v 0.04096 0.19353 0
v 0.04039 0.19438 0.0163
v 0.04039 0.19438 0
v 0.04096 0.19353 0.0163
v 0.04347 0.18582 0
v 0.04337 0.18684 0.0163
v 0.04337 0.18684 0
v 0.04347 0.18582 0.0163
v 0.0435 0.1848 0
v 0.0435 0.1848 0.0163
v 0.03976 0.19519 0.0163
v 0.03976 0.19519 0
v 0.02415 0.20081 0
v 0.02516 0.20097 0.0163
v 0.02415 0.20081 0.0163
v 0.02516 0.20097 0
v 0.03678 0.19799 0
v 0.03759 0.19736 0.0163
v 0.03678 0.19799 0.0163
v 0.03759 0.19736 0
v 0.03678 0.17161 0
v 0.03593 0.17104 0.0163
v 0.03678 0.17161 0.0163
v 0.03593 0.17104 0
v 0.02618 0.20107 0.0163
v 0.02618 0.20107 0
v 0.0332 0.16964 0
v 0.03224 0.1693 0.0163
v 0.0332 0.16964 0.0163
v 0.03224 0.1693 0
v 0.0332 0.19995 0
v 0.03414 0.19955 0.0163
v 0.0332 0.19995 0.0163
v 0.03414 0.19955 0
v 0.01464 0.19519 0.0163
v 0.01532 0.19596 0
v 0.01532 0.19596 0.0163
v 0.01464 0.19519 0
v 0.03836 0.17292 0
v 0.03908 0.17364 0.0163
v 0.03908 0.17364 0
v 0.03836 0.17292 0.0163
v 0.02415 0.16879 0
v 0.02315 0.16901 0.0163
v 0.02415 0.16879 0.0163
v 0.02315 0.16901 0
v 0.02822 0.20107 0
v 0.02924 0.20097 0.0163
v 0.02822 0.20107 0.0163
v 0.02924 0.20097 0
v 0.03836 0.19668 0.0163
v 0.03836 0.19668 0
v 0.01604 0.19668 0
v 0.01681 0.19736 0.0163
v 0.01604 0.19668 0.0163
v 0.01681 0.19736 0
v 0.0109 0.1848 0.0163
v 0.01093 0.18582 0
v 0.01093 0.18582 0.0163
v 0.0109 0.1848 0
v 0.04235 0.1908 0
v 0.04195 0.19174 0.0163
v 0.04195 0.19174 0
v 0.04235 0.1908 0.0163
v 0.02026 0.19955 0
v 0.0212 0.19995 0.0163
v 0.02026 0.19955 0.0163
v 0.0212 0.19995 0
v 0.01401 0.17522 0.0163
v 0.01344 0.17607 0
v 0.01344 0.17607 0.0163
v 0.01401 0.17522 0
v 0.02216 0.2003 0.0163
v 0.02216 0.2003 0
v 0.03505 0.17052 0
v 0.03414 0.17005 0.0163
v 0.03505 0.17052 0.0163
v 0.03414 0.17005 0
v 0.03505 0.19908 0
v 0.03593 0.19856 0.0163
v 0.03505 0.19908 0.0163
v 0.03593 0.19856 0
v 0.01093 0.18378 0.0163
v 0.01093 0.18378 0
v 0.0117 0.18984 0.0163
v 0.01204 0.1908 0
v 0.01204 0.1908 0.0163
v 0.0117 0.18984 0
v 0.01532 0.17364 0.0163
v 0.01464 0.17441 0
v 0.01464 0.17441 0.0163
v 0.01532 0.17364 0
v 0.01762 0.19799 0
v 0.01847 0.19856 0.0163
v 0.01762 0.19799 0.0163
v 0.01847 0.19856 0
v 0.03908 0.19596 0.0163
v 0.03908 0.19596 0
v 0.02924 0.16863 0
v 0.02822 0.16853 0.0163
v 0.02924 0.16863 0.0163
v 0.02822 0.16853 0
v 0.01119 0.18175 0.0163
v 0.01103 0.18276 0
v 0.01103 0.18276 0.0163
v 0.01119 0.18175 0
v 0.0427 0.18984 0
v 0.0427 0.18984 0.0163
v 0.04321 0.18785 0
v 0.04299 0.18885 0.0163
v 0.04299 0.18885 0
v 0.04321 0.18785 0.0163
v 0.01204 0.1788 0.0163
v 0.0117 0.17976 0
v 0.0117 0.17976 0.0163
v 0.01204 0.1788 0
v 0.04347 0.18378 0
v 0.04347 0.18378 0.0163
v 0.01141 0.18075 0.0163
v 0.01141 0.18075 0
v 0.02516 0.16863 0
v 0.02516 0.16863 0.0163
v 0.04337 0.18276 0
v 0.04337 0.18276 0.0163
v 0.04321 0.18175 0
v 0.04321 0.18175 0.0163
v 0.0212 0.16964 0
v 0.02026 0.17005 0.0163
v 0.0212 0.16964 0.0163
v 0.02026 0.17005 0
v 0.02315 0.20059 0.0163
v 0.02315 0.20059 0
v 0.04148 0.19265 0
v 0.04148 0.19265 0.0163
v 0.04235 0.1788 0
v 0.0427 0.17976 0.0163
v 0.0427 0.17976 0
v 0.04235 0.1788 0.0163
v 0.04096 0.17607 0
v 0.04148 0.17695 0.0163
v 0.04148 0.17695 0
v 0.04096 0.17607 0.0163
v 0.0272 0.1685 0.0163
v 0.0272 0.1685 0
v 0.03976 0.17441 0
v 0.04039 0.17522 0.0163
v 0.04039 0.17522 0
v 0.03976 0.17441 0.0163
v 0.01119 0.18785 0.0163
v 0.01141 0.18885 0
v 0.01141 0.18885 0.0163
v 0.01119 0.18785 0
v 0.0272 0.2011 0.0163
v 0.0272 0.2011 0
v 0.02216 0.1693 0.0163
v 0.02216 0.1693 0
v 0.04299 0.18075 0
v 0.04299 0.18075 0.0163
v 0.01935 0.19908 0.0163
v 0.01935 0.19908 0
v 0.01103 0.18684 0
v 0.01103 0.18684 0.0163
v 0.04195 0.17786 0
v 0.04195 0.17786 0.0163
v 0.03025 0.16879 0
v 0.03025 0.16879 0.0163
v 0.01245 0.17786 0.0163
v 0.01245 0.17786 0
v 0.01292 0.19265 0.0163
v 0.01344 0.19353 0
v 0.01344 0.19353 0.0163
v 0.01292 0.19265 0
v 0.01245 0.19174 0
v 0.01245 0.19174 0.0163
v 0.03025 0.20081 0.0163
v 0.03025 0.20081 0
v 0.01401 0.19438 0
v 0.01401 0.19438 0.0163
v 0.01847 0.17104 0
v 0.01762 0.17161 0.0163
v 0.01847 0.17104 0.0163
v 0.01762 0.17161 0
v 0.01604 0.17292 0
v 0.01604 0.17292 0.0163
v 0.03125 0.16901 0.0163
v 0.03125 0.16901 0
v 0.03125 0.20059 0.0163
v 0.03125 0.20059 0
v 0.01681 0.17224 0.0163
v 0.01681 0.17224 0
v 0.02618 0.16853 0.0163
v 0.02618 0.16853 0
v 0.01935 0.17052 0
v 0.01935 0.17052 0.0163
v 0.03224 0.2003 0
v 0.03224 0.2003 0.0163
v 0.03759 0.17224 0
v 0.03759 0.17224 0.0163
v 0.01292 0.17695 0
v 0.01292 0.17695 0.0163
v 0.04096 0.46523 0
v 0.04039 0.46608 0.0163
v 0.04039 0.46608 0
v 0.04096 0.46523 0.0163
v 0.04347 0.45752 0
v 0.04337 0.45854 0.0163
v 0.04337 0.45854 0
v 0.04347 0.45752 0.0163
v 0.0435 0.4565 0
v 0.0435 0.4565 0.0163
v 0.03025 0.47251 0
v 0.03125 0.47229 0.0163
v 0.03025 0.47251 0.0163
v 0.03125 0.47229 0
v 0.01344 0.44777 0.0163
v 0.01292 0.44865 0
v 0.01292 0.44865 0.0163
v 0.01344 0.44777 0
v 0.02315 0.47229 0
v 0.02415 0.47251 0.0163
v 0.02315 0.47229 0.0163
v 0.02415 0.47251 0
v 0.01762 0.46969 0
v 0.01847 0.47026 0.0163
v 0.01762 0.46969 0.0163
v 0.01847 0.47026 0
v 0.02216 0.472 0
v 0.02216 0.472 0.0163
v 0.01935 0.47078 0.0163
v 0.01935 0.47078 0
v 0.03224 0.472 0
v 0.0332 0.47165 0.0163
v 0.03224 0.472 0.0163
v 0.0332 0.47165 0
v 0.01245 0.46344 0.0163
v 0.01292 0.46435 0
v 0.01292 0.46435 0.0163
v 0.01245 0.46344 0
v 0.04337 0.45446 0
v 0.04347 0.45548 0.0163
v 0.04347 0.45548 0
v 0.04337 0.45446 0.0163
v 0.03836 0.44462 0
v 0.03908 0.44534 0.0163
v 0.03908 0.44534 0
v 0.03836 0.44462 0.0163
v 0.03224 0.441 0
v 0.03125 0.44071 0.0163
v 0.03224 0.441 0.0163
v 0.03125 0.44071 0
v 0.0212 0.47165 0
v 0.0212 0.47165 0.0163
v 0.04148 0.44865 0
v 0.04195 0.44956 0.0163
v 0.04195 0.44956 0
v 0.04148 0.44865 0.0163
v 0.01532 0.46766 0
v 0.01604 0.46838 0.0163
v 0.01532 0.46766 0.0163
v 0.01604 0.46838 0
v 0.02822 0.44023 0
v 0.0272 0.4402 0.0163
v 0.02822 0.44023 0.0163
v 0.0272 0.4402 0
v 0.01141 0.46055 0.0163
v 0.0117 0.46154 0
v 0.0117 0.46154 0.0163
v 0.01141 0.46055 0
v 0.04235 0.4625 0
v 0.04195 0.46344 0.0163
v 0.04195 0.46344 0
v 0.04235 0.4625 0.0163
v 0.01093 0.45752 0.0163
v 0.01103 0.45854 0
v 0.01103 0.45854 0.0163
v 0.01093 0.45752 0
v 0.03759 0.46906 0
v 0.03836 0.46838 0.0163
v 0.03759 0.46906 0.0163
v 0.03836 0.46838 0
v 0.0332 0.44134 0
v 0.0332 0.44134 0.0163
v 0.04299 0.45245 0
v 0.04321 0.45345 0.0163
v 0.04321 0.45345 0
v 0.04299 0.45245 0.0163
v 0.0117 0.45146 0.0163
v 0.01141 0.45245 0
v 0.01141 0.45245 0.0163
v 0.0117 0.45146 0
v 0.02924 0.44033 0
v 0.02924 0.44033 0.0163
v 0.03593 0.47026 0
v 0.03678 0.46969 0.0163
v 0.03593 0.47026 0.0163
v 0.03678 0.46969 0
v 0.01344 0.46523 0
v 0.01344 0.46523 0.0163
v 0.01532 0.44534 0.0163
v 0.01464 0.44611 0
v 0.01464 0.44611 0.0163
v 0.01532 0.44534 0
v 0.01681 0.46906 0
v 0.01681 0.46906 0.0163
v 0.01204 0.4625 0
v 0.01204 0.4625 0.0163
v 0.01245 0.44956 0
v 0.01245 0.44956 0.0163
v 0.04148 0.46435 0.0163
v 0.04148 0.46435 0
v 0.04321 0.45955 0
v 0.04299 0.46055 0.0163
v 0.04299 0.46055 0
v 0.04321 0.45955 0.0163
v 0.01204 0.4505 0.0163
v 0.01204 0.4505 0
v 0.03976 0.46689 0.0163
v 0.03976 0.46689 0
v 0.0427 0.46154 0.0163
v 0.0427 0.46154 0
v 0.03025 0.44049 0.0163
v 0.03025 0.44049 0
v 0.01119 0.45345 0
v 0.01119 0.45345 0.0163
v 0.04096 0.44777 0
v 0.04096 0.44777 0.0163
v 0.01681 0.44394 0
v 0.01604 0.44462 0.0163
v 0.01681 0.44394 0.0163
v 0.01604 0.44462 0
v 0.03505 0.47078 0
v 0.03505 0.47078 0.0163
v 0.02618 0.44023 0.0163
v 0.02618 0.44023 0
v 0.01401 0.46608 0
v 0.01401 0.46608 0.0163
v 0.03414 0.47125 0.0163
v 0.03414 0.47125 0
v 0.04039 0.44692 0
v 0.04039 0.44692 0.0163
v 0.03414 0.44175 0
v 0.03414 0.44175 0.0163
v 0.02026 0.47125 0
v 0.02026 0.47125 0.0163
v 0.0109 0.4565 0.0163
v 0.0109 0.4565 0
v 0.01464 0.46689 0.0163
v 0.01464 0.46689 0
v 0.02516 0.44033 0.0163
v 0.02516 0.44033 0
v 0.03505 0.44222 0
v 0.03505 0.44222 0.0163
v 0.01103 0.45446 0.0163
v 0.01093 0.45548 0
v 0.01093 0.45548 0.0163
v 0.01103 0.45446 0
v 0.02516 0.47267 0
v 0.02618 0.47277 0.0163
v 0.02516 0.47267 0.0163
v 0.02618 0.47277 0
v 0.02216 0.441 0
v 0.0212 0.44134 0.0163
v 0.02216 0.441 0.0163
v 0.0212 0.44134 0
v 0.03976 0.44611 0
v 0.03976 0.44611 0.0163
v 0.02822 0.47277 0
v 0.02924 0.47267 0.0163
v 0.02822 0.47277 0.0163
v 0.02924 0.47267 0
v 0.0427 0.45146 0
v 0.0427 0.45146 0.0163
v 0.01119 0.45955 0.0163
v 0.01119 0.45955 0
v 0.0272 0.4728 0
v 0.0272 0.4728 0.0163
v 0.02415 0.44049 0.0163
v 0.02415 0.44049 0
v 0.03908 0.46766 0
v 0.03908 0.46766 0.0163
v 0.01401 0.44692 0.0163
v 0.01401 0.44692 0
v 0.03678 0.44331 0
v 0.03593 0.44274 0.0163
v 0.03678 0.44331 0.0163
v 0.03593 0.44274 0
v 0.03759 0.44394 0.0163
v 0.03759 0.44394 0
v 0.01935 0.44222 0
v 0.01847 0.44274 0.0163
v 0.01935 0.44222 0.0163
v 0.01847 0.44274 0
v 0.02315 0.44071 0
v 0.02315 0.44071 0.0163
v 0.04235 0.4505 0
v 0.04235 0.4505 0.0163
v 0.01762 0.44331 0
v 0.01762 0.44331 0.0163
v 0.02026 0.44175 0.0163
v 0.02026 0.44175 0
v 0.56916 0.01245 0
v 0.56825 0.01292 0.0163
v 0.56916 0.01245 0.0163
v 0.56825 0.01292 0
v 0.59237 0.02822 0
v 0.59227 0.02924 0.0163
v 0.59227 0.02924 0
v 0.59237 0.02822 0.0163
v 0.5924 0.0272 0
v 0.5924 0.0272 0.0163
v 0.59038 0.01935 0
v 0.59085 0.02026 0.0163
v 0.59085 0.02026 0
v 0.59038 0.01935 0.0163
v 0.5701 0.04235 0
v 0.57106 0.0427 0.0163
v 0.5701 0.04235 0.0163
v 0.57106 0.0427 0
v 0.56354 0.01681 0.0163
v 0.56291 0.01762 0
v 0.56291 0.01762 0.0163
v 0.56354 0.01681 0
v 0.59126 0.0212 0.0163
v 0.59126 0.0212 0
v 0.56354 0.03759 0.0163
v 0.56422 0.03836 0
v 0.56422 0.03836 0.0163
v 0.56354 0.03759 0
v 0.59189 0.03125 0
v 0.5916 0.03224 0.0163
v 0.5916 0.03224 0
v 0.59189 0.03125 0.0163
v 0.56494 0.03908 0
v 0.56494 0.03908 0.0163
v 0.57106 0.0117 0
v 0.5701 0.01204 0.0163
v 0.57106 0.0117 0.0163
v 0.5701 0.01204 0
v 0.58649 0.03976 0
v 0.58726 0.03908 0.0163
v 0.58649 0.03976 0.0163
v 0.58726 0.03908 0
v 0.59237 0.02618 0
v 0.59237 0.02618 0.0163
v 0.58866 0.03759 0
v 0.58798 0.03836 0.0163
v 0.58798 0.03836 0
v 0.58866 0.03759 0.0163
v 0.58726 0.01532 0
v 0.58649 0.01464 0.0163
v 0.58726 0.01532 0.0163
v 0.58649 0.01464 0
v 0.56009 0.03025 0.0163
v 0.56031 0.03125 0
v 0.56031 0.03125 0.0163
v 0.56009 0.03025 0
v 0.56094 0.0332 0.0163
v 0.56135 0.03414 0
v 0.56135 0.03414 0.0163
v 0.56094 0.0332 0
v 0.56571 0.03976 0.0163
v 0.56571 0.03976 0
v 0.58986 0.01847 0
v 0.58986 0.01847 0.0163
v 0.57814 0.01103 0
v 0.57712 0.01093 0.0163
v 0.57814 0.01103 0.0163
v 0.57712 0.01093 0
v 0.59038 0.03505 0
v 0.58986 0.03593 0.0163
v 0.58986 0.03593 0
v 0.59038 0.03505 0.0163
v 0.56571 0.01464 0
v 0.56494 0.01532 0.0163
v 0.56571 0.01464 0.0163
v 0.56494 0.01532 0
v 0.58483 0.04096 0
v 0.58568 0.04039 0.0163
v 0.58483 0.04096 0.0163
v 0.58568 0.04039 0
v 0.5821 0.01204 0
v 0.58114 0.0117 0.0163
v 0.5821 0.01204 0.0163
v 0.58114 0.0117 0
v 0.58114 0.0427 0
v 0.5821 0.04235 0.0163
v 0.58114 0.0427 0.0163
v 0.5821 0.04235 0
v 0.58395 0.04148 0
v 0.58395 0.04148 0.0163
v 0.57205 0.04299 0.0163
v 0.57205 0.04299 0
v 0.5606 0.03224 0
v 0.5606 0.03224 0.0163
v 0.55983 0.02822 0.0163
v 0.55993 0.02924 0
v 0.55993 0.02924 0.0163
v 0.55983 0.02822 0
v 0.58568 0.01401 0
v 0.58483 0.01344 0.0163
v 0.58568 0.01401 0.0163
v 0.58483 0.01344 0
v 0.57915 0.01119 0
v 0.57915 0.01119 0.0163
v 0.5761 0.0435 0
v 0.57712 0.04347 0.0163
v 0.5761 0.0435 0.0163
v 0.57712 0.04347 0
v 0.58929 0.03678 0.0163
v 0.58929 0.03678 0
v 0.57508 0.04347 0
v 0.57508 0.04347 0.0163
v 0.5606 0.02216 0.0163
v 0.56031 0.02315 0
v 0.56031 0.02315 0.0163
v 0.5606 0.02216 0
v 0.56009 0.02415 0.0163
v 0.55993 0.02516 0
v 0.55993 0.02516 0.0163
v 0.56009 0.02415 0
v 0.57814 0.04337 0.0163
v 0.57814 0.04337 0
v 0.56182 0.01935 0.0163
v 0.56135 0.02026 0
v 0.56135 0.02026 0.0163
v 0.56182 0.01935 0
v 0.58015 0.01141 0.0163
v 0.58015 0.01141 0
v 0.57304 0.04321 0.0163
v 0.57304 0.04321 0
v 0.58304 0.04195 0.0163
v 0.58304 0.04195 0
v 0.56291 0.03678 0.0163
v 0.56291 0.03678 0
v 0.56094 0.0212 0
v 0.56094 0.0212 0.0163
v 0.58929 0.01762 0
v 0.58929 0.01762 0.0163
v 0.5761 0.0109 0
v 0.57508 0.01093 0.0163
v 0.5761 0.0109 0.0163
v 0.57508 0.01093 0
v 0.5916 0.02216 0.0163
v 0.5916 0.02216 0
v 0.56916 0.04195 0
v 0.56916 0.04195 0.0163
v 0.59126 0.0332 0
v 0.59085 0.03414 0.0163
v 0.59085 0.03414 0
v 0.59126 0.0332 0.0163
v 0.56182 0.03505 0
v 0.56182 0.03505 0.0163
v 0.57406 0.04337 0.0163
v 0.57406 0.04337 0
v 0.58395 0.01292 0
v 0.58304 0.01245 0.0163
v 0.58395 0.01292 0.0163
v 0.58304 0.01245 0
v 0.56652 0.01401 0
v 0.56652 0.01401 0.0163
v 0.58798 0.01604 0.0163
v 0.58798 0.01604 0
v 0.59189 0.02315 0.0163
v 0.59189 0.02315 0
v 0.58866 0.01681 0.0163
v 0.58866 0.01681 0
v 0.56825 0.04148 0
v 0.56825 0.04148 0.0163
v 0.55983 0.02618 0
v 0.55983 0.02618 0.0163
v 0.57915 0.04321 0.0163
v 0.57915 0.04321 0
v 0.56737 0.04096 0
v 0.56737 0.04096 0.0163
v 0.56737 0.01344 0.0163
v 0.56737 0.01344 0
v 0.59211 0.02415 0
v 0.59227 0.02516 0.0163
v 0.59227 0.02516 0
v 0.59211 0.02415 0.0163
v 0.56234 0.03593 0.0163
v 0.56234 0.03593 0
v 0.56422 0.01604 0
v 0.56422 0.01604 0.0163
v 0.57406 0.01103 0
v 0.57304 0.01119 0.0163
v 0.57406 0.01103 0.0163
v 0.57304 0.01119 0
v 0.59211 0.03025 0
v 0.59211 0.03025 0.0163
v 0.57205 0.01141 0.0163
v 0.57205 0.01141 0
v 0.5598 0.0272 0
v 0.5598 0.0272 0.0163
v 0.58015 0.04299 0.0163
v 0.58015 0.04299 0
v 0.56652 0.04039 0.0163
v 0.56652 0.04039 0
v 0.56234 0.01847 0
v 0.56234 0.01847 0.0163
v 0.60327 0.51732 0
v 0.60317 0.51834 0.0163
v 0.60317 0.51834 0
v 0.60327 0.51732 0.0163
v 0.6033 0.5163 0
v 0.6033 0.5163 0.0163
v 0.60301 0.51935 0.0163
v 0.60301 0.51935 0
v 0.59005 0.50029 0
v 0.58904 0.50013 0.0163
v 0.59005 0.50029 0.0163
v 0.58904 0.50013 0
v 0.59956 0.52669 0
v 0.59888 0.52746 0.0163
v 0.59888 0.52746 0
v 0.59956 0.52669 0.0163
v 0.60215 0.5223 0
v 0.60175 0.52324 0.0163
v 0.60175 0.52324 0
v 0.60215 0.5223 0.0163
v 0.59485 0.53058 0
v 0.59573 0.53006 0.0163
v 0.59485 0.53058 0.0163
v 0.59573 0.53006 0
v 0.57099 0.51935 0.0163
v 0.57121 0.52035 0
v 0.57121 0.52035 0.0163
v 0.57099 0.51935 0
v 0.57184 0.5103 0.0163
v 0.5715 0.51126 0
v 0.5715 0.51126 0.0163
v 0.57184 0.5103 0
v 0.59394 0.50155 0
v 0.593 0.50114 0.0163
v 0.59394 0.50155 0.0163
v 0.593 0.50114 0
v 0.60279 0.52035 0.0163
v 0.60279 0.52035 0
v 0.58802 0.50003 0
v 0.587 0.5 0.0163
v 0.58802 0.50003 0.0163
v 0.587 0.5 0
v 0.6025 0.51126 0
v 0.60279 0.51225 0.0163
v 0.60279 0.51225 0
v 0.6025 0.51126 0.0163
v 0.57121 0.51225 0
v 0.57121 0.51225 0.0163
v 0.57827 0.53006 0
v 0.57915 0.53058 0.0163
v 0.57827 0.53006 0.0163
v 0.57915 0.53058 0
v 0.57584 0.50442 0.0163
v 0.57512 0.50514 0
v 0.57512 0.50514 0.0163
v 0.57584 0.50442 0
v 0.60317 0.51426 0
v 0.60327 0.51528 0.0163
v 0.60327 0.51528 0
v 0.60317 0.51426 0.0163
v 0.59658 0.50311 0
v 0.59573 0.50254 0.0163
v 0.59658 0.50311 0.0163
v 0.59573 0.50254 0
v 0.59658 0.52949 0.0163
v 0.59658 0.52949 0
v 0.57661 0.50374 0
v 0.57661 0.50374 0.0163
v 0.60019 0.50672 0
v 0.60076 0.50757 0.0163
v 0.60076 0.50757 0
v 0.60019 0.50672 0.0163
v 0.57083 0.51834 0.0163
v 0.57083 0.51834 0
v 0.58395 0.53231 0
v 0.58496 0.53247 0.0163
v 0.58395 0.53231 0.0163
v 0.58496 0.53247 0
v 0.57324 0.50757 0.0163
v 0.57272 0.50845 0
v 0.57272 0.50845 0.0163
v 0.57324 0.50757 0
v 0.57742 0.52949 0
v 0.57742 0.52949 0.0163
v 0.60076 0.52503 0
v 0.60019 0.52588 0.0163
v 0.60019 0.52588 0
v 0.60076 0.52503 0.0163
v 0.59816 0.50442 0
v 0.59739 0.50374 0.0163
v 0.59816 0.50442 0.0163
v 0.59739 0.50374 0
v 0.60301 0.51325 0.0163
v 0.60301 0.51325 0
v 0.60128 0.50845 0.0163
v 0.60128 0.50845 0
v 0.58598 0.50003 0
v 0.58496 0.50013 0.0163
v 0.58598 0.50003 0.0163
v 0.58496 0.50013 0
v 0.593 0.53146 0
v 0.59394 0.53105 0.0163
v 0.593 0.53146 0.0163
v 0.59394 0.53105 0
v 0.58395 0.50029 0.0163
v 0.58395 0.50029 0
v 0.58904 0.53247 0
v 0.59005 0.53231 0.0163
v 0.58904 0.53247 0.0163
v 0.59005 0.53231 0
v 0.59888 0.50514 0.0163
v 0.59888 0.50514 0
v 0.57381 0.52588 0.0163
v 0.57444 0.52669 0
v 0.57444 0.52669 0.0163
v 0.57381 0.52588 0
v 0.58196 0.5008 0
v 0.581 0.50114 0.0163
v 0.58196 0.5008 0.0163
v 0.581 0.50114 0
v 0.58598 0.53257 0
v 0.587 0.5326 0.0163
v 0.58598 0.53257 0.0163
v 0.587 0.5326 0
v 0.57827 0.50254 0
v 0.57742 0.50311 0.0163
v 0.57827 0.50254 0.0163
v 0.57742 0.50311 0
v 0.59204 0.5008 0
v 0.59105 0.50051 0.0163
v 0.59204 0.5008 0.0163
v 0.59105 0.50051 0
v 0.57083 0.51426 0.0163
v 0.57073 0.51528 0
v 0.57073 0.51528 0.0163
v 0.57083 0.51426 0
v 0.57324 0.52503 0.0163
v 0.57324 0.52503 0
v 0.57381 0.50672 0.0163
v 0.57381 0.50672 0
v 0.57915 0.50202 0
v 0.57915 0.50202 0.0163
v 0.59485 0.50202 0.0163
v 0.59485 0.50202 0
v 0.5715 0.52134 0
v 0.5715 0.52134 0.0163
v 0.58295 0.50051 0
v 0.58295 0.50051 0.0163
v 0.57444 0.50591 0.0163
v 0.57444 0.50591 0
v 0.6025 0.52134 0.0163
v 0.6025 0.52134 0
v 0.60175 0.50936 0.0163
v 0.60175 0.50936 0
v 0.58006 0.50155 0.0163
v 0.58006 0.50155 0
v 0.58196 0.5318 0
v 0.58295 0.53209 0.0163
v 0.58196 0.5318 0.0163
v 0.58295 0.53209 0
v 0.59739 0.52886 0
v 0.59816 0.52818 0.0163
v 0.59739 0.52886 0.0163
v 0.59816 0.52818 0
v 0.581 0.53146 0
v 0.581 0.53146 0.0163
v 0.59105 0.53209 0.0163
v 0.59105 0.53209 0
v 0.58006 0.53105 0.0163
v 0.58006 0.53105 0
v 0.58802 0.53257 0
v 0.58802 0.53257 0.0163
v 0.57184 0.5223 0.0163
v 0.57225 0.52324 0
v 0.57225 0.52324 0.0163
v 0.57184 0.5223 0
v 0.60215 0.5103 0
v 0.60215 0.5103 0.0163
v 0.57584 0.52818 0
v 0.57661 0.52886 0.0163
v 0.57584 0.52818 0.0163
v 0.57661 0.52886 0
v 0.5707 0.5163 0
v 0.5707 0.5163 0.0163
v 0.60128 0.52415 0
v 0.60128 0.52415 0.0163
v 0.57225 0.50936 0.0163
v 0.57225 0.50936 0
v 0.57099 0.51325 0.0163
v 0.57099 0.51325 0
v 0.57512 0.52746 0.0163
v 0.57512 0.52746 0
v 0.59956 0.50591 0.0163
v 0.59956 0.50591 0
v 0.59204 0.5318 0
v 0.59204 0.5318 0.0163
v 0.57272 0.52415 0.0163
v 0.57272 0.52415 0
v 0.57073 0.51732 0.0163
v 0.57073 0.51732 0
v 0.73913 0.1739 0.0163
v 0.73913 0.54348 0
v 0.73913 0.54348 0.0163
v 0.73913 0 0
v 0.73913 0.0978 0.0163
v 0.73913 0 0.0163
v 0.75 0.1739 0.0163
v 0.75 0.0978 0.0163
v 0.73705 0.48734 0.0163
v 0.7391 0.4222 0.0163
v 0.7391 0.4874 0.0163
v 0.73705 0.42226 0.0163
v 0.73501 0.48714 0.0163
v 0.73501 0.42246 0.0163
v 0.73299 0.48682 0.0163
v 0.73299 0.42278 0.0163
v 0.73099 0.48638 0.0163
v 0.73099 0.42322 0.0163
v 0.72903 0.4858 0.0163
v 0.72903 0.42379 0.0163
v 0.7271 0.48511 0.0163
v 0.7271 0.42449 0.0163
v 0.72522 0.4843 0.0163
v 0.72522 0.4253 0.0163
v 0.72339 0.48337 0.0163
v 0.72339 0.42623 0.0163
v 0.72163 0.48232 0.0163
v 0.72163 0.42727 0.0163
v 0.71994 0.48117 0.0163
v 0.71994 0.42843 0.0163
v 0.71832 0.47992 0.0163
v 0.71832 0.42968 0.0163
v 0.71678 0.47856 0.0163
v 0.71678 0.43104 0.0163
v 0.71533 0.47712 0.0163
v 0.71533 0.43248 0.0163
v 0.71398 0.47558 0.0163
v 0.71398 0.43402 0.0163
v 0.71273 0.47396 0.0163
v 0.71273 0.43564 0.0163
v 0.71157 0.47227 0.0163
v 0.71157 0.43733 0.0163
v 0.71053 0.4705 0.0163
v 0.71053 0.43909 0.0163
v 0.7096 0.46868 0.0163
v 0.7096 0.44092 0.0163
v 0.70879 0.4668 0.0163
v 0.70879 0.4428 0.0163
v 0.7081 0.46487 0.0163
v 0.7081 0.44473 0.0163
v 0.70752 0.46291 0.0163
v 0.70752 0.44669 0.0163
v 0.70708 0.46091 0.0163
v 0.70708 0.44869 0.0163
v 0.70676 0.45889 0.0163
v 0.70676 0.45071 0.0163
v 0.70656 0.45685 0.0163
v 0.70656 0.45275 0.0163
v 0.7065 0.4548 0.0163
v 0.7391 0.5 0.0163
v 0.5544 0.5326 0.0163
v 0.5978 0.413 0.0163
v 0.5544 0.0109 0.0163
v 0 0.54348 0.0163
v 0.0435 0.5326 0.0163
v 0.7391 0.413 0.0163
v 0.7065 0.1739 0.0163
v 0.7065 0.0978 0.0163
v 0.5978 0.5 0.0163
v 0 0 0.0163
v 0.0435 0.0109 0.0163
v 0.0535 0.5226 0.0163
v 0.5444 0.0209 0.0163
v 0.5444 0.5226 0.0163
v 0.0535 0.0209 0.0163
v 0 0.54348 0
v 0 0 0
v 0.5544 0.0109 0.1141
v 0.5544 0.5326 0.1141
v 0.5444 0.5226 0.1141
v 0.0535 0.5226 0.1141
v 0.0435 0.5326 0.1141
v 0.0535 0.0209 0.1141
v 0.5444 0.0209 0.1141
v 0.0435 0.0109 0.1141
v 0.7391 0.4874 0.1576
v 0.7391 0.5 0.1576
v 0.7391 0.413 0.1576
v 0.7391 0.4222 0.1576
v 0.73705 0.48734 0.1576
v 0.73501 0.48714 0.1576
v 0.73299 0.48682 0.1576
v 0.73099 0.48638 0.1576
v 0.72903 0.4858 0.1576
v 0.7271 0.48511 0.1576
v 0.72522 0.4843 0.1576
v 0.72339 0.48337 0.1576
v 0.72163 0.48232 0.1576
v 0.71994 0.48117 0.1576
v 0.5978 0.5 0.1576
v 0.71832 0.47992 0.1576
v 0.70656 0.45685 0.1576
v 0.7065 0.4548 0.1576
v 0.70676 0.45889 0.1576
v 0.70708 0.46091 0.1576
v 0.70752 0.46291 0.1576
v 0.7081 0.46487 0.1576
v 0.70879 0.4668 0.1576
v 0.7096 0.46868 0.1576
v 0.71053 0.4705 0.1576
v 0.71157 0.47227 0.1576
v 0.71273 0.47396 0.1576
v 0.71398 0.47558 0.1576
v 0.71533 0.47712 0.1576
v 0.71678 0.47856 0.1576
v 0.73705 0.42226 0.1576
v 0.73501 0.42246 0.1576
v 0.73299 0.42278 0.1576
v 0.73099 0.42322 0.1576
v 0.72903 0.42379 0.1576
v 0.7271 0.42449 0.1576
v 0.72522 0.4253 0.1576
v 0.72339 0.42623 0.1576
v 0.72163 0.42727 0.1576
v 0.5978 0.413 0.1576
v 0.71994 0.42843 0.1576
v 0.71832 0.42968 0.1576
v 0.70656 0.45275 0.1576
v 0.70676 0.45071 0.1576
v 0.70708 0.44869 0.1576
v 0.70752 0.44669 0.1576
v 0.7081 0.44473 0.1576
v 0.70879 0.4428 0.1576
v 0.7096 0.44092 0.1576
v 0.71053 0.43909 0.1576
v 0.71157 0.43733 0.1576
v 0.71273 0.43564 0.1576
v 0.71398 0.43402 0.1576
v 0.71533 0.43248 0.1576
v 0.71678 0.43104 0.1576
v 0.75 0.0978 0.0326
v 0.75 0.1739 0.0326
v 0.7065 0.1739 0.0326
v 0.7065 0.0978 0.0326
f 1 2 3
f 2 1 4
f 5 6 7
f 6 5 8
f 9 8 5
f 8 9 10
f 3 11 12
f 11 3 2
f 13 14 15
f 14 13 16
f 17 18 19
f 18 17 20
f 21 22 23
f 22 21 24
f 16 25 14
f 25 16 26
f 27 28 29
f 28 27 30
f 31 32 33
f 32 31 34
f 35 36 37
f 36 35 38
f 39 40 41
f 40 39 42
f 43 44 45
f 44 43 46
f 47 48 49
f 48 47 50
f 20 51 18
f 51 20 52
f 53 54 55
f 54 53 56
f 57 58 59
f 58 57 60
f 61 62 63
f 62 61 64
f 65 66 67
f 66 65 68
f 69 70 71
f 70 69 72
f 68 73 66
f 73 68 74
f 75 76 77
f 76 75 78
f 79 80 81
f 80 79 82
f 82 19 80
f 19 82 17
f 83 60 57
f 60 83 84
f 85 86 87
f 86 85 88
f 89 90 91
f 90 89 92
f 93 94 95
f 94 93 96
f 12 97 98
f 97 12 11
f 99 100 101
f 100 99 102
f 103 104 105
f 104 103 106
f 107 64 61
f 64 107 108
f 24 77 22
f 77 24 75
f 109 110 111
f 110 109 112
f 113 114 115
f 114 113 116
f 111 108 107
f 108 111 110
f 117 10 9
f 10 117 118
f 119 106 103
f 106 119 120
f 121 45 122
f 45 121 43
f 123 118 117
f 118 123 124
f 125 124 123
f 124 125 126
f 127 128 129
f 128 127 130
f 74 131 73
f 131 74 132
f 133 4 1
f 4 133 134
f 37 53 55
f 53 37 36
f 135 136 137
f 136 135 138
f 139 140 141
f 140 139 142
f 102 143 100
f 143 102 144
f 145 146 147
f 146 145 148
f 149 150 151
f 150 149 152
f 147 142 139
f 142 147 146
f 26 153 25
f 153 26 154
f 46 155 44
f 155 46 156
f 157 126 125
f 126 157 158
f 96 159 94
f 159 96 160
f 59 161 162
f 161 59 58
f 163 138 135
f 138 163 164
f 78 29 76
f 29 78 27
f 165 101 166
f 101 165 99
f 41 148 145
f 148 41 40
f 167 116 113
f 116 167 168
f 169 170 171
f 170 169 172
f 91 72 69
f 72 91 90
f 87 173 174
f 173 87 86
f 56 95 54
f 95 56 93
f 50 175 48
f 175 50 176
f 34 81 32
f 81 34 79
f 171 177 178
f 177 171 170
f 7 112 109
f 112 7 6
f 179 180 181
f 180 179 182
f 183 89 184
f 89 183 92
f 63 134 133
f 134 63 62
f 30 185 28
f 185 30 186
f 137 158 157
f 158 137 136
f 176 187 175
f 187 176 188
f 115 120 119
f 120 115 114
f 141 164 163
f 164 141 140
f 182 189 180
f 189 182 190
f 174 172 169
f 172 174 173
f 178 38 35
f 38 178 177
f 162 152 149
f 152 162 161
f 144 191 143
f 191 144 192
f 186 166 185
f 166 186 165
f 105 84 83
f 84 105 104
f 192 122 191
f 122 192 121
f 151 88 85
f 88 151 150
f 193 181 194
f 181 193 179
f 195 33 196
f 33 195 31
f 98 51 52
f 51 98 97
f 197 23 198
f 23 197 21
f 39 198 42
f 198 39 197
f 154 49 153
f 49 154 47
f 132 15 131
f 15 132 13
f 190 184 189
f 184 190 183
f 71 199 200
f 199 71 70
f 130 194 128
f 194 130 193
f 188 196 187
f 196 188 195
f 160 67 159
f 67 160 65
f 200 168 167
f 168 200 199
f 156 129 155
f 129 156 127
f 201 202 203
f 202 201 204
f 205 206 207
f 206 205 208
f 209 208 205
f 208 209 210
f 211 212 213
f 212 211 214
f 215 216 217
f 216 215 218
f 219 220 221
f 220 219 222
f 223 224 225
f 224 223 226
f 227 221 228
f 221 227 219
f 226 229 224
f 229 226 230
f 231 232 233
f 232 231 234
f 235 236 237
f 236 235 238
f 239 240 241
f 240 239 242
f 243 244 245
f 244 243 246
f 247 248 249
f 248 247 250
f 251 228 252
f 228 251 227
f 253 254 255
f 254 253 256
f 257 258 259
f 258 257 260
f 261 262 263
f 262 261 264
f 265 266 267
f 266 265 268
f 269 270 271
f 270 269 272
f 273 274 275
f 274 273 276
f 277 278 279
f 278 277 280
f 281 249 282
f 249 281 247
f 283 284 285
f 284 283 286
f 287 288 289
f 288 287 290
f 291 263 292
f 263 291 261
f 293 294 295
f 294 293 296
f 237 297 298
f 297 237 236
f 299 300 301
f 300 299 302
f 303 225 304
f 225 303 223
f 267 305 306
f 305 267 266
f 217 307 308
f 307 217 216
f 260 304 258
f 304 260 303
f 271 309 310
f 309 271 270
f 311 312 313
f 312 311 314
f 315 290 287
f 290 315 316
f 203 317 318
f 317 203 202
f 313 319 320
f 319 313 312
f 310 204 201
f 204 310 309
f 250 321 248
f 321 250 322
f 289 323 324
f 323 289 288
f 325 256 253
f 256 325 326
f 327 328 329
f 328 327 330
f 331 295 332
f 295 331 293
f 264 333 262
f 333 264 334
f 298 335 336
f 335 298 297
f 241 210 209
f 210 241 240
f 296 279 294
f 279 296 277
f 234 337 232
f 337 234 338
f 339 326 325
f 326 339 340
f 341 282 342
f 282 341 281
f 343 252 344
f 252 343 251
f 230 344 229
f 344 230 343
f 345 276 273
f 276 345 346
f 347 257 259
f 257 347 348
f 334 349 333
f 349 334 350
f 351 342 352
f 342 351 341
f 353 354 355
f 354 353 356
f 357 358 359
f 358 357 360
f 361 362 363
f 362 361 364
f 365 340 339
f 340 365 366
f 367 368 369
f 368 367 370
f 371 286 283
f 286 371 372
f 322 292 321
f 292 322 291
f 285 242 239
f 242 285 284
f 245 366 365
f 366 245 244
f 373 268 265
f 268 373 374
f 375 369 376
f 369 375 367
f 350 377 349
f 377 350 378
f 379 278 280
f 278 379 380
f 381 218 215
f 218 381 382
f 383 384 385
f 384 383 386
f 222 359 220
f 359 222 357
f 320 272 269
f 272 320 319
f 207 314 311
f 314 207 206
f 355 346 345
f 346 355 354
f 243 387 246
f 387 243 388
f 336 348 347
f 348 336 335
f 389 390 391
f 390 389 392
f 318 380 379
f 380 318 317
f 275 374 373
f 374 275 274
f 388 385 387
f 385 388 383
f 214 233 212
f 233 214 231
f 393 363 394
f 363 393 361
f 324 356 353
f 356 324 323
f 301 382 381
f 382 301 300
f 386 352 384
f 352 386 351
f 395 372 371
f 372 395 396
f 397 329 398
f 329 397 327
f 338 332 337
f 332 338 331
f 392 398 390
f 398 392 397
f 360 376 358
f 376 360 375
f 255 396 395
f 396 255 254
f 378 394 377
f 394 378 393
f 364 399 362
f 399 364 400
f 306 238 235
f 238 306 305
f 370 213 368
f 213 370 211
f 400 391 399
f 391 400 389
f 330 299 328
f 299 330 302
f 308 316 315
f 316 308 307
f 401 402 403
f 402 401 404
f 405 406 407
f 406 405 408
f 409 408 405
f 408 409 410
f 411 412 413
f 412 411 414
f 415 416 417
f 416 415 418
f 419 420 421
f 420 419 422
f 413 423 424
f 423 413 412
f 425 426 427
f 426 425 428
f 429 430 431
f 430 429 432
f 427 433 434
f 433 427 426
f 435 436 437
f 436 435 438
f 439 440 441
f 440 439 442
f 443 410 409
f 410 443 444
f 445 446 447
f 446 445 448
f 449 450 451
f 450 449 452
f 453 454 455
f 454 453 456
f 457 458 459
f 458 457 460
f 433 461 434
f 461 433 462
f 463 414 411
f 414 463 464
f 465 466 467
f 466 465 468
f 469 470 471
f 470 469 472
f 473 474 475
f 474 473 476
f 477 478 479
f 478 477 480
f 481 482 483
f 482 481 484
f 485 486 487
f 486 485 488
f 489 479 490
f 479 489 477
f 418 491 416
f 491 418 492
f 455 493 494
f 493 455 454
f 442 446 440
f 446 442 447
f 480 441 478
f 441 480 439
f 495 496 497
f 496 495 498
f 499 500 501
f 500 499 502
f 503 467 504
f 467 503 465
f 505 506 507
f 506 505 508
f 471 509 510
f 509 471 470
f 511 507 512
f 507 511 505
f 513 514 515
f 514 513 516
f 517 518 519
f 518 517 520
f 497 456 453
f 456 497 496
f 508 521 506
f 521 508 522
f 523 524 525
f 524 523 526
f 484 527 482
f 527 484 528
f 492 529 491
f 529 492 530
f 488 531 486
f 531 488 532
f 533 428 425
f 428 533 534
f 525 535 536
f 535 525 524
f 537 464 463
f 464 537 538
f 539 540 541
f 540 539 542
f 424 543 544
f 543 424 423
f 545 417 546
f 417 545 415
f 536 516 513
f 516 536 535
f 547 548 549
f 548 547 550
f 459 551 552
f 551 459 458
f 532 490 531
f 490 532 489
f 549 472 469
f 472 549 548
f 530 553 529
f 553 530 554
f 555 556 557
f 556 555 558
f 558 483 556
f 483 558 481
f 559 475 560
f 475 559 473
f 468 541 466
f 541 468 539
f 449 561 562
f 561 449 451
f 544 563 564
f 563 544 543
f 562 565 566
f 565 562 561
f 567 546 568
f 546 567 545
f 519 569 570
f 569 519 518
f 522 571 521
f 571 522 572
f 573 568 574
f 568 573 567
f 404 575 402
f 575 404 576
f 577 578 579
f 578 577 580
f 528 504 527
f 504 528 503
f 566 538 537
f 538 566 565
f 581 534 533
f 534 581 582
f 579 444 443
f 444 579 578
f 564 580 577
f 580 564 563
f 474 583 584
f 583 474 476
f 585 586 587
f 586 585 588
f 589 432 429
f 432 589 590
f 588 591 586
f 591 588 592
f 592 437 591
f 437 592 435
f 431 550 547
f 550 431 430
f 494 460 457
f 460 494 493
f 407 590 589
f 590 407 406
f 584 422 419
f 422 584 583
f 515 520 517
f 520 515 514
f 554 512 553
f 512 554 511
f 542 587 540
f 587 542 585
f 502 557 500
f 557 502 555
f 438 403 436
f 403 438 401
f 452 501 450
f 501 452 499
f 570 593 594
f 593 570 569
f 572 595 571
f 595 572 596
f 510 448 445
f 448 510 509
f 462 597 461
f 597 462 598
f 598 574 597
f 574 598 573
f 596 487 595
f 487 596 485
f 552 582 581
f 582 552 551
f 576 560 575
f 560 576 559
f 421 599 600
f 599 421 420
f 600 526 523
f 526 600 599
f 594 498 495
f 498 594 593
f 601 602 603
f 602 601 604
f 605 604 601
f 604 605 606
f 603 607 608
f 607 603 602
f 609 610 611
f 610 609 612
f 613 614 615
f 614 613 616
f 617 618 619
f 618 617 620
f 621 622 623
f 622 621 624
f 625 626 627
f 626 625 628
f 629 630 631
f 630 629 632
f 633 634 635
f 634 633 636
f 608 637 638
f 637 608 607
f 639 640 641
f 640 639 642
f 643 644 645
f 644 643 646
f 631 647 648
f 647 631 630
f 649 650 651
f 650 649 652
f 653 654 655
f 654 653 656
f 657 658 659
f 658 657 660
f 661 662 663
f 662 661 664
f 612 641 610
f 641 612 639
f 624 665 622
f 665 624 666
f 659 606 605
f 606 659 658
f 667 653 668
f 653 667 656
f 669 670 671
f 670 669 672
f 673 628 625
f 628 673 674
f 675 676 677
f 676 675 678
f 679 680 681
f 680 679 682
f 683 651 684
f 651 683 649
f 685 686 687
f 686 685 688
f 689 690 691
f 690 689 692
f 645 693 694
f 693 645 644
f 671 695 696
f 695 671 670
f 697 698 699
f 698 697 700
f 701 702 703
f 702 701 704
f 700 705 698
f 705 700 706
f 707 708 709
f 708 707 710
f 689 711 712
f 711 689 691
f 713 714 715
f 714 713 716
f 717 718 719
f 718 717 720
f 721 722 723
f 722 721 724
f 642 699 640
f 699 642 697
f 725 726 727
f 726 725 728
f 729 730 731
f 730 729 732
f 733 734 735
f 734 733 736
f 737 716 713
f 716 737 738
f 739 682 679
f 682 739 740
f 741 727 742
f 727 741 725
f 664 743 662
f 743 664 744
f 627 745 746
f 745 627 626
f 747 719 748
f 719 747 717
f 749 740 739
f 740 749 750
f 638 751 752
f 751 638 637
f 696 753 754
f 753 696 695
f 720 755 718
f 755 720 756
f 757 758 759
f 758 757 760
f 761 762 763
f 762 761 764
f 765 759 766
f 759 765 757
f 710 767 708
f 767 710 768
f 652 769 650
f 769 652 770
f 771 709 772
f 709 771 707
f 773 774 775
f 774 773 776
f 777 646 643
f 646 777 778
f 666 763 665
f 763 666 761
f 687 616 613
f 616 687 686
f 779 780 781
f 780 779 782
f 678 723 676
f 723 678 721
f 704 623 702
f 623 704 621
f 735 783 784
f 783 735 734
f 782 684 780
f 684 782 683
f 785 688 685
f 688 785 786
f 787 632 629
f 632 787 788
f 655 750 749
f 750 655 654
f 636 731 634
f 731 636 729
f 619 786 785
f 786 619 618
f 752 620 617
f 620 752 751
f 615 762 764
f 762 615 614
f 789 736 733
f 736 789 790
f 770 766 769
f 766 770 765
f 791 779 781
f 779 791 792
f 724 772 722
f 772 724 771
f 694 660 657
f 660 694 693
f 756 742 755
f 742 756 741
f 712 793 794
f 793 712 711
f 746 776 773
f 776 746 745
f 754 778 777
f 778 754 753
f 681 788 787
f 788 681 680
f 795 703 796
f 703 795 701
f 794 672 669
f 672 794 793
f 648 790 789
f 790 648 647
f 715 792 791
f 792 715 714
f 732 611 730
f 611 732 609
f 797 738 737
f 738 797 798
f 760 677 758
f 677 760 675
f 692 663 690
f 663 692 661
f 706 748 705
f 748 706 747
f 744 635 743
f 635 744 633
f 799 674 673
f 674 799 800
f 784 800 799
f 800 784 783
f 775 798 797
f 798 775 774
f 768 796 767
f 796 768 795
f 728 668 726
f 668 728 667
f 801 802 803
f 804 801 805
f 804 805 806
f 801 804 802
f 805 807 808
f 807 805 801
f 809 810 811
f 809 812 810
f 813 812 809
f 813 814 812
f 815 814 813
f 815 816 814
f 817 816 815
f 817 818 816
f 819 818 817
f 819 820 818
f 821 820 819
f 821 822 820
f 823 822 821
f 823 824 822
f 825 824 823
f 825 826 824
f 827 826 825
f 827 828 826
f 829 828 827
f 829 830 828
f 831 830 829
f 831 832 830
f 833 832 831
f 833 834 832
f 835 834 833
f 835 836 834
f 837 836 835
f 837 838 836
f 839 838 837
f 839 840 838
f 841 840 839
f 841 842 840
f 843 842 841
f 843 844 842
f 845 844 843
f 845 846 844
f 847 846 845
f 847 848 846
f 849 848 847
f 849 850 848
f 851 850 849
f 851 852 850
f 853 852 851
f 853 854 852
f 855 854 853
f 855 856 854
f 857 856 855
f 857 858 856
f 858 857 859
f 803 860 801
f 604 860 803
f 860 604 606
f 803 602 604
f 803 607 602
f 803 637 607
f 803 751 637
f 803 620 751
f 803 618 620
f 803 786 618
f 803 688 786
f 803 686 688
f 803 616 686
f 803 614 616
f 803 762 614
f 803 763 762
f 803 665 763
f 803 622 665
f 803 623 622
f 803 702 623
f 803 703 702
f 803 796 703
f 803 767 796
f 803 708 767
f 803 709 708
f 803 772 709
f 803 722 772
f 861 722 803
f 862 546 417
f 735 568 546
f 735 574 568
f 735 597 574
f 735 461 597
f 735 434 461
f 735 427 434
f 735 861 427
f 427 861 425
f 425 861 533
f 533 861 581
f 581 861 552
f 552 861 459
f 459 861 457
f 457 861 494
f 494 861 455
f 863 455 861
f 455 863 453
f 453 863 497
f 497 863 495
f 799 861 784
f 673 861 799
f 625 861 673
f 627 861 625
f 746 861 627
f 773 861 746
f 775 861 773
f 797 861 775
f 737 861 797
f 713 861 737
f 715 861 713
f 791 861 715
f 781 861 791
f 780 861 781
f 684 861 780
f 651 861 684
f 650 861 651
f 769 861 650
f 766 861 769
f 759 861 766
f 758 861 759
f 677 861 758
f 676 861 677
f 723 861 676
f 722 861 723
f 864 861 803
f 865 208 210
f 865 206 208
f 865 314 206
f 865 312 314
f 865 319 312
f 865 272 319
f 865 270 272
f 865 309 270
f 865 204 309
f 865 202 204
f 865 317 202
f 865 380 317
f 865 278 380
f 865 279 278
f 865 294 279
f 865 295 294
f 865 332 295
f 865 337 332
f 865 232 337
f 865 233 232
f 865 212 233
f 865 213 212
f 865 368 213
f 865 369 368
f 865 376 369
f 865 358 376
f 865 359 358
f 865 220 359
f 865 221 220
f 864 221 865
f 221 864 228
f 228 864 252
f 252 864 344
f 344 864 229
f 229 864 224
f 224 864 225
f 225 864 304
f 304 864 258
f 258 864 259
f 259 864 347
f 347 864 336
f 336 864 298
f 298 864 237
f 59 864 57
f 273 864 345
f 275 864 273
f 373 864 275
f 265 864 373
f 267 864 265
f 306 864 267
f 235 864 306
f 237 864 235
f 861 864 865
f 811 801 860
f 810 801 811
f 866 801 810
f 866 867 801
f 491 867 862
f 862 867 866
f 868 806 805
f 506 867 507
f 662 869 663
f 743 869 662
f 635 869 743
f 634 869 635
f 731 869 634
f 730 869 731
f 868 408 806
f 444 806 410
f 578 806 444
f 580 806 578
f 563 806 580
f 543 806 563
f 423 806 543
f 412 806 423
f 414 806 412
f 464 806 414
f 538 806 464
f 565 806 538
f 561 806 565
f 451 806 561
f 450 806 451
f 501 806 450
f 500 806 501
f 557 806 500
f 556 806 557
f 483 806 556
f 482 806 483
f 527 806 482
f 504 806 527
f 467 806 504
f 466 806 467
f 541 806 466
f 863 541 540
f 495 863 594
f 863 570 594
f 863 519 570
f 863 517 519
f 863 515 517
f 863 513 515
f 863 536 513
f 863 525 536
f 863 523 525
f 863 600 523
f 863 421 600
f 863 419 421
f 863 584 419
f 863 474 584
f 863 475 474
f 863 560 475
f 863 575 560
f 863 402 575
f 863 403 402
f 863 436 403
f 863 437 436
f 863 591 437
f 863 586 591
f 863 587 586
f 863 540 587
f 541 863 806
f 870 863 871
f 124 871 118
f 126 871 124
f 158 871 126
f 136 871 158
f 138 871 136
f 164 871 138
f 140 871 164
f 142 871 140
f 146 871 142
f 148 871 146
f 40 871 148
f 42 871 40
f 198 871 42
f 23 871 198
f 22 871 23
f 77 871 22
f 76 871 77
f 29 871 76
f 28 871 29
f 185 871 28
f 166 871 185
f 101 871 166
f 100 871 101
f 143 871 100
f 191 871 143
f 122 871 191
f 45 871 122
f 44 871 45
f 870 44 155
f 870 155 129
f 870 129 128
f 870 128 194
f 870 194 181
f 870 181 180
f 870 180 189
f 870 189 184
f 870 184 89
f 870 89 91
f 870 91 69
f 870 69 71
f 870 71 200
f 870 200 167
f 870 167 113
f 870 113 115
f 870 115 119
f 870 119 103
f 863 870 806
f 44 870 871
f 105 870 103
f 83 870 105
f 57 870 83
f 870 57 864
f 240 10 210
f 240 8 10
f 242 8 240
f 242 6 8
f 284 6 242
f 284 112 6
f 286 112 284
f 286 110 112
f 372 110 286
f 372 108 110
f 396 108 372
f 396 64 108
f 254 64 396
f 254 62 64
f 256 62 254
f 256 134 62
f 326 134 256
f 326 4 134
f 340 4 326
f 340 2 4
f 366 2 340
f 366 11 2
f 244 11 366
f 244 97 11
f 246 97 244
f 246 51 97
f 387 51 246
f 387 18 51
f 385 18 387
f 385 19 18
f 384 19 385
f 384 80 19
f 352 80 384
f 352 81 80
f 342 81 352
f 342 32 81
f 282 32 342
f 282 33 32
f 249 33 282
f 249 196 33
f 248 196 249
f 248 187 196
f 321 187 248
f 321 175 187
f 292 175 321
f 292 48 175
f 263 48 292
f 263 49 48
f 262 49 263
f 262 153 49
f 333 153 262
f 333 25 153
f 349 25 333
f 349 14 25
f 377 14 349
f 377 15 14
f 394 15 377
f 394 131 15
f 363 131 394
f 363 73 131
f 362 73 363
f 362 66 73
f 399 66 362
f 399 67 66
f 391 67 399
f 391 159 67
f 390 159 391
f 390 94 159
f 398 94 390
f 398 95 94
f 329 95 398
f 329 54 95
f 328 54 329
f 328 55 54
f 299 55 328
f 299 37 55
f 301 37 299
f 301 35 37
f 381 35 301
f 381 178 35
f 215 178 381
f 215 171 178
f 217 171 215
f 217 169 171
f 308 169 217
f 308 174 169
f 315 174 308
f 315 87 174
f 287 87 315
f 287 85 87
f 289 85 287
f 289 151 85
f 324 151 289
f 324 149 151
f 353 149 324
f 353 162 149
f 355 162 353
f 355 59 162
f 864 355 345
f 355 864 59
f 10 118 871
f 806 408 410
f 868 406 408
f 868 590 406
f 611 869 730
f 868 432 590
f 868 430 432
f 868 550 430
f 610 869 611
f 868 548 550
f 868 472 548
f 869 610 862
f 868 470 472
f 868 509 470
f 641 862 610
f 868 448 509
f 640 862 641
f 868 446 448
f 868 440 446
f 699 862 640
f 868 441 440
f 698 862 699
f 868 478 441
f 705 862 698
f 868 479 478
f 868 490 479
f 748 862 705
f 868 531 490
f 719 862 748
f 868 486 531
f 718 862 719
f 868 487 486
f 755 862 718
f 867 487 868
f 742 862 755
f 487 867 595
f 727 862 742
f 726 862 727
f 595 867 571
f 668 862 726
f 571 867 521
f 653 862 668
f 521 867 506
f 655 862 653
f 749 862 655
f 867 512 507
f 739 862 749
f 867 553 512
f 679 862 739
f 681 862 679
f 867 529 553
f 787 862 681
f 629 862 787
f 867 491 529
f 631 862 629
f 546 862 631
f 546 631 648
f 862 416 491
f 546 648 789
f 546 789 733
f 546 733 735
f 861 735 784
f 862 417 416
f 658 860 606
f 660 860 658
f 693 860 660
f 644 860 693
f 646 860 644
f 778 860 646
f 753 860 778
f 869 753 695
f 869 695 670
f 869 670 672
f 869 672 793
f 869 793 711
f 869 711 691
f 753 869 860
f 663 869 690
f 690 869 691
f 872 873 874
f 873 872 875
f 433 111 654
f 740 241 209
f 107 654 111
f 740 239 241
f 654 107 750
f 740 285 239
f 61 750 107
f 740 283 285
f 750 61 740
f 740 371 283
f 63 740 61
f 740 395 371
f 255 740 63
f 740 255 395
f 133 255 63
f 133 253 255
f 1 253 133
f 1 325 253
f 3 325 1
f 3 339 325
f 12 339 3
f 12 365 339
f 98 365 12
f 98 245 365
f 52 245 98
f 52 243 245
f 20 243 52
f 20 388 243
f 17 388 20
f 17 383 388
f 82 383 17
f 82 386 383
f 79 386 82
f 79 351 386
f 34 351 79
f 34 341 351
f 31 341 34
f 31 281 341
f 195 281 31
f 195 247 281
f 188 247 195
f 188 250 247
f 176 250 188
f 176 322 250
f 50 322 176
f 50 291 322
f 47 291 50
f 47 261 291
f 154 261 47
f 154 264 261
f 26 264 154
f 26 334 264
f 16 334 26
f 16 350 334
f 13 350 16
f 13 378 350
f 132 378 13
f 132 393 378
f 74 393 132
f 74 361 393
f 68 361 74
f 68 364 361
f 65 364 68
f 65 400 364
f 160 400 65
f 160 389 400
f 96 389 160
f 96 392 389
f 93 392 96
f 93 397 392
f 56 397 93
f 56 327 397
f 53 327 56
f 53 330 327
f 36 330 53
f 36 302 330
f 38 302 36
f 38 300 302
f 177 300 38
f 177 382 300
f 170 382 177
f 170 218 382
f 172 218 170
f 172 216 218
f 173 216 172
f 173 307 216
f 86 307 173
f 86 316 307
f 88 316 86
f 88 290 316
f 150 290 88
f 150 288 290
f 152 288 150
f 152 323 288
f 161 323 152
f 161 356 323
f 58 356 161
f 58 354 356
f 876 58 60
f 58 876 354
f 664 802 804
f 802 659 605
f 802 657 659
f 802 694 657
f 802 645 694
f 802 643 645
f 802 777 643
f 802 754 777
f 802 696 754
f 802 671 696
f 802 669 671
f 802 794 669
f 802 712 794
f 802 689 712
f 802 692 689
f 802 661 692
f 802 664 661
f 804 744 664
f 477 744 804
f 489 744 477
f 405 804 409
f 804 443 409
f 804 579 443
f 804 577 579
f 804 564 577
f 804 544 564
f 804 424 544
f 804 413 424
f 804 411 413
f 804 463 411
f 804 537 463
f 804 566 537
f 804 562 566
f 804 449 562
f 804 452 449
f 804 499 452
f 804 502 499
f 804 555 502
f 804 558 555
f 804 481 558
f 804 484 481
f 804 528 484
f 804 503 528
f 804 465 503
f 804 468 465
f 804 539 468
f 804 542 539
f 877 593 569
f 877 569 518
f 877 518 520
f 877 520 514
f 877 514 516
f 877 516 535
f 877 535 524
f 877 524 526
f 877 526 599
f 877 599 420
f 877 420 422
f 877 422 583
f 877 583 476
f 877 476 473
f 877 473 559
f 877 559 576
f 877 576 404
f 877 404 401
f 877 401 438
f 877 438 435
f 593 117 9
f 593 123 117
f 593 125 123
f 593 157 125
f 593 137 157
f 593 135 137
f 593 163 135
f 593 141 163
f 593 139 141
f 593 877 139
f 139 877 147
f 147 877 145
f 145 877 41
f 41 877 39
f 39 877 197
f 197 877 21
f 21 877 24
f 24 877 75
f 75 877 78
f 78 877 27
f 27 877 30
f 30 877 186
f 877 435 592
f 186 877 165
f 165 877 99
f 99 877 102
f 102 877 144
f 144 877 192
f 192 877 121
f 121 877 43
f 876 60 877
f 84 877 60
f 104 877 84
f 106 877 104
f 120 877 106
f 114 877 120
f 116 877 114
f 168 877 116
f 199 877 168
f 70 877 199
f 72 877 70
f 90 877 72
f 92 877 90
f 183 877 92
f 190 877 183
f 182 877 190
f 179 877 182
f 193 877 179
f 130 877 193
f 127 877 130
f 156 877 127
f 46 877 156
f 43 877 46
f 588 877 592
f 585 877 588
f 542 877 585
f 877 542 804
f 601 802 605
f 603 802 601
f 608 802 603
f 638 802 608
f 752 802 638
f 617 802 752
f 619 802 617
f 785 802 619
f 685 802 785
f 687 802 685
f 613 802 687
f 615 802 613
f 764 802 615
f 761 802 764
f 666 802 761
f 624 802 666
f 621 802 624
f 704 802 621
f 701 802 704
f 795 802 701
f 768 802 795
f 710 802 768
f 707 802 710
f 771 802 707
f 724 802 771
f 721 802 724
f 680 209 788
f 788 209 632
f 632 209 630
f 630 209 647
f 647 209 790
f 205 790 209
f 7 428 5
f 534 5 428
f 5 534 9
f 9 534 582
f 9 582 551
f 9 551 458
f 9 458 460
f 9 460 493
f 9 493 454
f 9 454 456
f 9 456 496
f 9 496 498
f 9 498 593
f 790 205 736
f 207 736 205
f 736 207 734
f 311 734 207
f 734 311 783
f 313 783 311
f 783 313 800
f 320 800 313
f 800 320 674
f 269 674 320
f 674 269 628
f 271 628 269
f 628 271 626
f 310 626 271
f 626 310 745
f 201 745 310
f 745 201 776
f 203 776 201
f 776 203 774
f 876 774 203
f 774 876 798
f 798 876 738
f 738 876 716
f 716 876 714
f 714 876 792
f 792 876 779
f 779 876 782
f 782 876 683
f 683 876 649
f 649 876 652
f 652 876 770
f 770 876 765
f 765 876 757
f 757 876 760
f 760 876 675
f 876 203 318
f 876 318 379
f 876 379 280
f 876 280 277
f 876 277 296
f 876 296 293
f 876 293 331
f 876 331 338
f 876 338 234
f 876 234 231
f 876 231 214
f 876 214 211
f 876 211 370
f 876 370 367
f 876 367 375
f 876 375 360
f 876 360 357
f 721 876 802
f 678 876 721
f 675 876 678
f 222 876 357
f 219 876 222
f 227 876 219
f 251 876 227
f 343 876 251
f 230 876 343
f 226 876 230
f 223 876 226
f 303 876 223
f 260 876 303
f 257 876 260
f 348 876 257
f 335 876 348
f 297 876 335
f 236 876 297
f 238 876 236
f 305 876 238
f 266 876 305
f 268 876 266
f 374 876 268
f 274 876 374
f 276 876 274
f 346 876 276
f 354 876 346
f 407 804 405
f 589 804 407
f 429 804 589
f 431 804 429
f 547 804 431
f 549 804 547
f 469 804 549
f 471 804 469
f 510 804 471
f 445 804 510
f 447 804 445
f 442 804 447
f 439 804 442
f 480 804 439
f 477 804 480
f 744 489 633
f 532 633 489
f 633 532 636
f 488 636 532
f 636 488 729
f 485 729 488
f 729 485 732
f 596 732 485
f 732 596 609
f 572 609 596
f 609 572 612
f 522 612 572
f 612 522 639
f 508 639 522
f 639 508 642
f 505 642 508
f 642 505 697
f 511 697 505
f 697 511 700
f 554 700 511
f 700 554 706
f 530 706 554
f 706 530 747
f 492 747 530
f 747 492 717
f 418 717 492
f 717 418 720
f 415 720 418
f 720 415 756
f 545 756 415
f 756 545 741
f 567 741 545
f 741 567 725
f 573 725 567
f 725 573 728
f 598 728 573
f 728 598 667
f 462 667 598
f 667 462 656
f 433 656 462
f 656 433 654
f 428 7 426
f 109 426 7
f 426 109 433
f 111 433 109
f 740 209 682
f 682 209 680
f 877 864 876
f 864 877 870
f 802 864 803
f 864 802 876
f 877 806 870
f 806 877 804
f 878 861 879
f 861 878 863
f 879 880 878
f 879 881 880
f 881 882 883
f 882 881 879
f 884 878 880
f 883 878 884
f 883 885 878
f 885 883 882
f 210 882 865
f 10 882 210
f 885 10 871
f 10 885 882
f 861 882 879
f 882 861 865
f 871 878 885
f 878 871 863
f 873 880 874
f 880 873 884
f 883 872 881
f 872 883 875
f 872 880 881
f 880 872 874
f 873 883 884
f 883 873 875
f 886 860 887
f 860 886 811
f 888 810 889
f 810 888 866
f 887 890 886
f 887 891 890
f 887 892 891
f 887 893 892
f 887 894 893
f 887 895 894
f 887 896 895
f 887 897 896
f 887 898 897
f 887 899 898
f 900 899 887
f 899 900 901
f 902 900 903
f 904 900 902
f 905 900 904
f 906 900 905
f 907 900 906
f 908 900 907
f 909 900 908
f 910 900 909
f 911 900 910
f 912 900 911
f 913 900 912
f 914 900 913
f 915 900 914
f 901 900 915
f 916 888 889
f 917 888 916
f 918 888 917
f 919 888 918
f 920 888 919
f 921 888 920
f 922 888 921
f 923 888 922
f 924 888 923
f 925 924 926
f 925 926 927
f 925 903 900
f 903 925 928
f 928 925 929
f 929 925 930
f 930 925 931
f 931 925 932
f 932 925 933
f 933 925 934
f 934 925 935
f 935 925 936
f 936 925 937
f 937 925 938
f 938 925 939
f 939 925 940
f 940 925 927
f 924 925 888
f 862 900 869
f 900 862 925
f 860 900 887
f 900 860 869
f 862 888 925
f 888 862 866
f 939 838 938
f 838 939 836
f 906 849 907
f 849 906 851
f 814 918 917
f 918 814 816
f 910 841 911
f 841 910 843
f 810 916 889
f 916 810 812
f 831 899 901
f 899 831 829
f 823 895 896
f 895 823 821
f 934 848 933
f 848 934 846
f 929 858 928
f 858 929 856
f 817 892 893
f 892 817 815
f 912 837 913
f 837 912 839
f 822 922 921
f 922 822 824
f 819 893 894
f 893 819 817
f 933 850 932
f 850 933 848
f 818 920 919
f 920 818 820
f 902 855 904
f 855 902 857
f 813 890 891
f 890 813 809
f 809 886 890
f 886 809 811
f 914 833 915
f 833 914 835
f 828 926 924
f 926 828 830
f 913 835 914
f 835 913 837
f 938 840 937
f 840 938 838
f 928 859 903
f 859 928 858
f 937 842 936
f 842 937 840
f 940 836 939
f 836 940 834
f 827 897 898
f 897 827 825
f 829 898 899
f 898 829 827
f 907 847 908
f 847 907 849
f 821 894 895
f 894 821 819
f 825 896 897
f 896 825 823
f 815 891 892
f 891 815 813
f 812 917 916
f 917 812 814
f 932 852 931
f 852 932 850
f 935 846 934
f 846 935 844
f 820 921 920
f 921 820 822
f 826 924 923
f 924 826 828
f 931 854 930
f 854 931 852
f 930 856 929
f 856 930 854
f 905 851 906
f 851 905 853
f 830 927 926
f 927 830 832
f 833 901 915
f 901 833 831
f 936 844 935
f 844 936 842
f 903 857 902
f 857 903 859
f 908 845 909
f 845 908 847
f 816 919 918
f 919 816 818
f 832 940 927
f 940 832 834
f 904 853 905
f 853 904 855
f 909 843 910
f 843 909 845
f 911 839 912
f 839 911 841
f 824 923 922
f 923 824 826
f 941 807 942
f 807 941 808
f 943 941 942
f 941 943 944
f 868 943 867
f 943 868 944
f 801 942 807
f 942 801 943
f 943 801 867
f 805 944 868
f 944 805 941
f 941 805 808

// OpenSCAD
// Main base plate dimensions
base_length = 0.73913;
base_width = 0.543478;
base_height = 0.016304;

// Circular through opening parameters
hole_radius = 0.0163;
hole_centers = [
    [0.0272, 0.1848],
    [0.0272, 0.4565],
    [0.5761, 0.0272],
    [0.587, 0.5163]
];

// Raised rail group parameters
rail_outer_length = 0.5109;
rail_outer_width = 0.5217;
rail_offset_left = 0.0435;
rail_offset_right = 0.1847;
rail_offset_front = 0.0109;
rail_offset_back = 0.0109;
rail_height = 0.0978;
rail_wall_thickness = 0.01; // Assumed wall thickness for rib outlines

// Shallow tab parameters
tab_length = 0.0435;
tab_width = 0.0761;
tab_offset_left = 0.7065;
tab_offset_right = -0.0109; // Negative indicates overhang beyond base edge
tab_offset_front = 0.0978;
tab_offset_back = 0.3696;
tab_height = 0.0163;

// Deeper side block parameters
block_length = 0.1413;
block_width = 0.087;
block_offset_left = 0.5978;
block_offset_right = 0;
block_offset_front = 0.413;
block_offset_back = 0.0435;
block_height = 0.1413;
block_hole_radius = 0.0326;
block_hole_center_left = 0.7391;
block_hole_center_front = 0.4548;

$fn = 100;

// Main base plate
module base_plate() {
    cube([base_length, base_width, base_height]);
}

// Circular through holes in base plate
module base_holes() {
    for (center = hole_centers) {
        translate([center[0], center[1], -0.001])
            cylinder(h = base_height + 0.002, r = hole_radius);
    }
}

// Raised rail group as rectangular rib outlines
module rail_group() {
    // Outer rail rectangle position
    outer_x = rail_offset_left;
    outer_y = rail_offset_front;
    outer_z = base_height;
    
    // Inner rectangle dimensions (subtract wall thickness from all sides)
    inner_length = rail_outer_length - 2 * rail_wall_thickness;
    inner_width = rail_outer_width - 2 * rail_wall_thickness;
    
    // Create frame by subtracting inner from outer
    difference() {
        // Outer rectangular frame
        translate([outer_x, outer_y, outer_z])
            cube([rail_outer_length, rail_outer_width, rail_height]);
        
        // Inner cutout
        translate([outer_x + rail_wall_thickness, outer_y + rail_wall_thickness, outer_z - 0.001])
            cube([inner_length, inner_width, rail_height + 0.002]);
    }
}

// Shallow rectangular tab
module shallow_tab() {
    // Calculate actual tab position considering overhang
    tab_x = tab_offset_left;
    tab_y = tab_offset_front;
    
    translate([tab_x, tab_y, base_height])
        cube([tab_length, tab_width, tab_height]);
}

// Deeper side block with circular hole
module deeper_block() {
    // Block position
    block_x = block_offset_left;
    block_y = block_offset_front;
    
    difference() {
        // Main block
        translate([block_x, block_y, base_height])
            cube([block_length, block_width, block_height]);
        
        // Circular through hole
        translate([block_hole_center_left, block_hole_center_front, base_height - 0.001])
            cylinder(h = block_height + 0.002, r = block_hole_radius);
    }
}

// Final assembly
difference() {
    // Start with base plate
    base_plate();
    
    // Subtract circular holes from base
    base_holes();
}

// Add raised features
rail_group();
shallow_tab();
deeper_block();
